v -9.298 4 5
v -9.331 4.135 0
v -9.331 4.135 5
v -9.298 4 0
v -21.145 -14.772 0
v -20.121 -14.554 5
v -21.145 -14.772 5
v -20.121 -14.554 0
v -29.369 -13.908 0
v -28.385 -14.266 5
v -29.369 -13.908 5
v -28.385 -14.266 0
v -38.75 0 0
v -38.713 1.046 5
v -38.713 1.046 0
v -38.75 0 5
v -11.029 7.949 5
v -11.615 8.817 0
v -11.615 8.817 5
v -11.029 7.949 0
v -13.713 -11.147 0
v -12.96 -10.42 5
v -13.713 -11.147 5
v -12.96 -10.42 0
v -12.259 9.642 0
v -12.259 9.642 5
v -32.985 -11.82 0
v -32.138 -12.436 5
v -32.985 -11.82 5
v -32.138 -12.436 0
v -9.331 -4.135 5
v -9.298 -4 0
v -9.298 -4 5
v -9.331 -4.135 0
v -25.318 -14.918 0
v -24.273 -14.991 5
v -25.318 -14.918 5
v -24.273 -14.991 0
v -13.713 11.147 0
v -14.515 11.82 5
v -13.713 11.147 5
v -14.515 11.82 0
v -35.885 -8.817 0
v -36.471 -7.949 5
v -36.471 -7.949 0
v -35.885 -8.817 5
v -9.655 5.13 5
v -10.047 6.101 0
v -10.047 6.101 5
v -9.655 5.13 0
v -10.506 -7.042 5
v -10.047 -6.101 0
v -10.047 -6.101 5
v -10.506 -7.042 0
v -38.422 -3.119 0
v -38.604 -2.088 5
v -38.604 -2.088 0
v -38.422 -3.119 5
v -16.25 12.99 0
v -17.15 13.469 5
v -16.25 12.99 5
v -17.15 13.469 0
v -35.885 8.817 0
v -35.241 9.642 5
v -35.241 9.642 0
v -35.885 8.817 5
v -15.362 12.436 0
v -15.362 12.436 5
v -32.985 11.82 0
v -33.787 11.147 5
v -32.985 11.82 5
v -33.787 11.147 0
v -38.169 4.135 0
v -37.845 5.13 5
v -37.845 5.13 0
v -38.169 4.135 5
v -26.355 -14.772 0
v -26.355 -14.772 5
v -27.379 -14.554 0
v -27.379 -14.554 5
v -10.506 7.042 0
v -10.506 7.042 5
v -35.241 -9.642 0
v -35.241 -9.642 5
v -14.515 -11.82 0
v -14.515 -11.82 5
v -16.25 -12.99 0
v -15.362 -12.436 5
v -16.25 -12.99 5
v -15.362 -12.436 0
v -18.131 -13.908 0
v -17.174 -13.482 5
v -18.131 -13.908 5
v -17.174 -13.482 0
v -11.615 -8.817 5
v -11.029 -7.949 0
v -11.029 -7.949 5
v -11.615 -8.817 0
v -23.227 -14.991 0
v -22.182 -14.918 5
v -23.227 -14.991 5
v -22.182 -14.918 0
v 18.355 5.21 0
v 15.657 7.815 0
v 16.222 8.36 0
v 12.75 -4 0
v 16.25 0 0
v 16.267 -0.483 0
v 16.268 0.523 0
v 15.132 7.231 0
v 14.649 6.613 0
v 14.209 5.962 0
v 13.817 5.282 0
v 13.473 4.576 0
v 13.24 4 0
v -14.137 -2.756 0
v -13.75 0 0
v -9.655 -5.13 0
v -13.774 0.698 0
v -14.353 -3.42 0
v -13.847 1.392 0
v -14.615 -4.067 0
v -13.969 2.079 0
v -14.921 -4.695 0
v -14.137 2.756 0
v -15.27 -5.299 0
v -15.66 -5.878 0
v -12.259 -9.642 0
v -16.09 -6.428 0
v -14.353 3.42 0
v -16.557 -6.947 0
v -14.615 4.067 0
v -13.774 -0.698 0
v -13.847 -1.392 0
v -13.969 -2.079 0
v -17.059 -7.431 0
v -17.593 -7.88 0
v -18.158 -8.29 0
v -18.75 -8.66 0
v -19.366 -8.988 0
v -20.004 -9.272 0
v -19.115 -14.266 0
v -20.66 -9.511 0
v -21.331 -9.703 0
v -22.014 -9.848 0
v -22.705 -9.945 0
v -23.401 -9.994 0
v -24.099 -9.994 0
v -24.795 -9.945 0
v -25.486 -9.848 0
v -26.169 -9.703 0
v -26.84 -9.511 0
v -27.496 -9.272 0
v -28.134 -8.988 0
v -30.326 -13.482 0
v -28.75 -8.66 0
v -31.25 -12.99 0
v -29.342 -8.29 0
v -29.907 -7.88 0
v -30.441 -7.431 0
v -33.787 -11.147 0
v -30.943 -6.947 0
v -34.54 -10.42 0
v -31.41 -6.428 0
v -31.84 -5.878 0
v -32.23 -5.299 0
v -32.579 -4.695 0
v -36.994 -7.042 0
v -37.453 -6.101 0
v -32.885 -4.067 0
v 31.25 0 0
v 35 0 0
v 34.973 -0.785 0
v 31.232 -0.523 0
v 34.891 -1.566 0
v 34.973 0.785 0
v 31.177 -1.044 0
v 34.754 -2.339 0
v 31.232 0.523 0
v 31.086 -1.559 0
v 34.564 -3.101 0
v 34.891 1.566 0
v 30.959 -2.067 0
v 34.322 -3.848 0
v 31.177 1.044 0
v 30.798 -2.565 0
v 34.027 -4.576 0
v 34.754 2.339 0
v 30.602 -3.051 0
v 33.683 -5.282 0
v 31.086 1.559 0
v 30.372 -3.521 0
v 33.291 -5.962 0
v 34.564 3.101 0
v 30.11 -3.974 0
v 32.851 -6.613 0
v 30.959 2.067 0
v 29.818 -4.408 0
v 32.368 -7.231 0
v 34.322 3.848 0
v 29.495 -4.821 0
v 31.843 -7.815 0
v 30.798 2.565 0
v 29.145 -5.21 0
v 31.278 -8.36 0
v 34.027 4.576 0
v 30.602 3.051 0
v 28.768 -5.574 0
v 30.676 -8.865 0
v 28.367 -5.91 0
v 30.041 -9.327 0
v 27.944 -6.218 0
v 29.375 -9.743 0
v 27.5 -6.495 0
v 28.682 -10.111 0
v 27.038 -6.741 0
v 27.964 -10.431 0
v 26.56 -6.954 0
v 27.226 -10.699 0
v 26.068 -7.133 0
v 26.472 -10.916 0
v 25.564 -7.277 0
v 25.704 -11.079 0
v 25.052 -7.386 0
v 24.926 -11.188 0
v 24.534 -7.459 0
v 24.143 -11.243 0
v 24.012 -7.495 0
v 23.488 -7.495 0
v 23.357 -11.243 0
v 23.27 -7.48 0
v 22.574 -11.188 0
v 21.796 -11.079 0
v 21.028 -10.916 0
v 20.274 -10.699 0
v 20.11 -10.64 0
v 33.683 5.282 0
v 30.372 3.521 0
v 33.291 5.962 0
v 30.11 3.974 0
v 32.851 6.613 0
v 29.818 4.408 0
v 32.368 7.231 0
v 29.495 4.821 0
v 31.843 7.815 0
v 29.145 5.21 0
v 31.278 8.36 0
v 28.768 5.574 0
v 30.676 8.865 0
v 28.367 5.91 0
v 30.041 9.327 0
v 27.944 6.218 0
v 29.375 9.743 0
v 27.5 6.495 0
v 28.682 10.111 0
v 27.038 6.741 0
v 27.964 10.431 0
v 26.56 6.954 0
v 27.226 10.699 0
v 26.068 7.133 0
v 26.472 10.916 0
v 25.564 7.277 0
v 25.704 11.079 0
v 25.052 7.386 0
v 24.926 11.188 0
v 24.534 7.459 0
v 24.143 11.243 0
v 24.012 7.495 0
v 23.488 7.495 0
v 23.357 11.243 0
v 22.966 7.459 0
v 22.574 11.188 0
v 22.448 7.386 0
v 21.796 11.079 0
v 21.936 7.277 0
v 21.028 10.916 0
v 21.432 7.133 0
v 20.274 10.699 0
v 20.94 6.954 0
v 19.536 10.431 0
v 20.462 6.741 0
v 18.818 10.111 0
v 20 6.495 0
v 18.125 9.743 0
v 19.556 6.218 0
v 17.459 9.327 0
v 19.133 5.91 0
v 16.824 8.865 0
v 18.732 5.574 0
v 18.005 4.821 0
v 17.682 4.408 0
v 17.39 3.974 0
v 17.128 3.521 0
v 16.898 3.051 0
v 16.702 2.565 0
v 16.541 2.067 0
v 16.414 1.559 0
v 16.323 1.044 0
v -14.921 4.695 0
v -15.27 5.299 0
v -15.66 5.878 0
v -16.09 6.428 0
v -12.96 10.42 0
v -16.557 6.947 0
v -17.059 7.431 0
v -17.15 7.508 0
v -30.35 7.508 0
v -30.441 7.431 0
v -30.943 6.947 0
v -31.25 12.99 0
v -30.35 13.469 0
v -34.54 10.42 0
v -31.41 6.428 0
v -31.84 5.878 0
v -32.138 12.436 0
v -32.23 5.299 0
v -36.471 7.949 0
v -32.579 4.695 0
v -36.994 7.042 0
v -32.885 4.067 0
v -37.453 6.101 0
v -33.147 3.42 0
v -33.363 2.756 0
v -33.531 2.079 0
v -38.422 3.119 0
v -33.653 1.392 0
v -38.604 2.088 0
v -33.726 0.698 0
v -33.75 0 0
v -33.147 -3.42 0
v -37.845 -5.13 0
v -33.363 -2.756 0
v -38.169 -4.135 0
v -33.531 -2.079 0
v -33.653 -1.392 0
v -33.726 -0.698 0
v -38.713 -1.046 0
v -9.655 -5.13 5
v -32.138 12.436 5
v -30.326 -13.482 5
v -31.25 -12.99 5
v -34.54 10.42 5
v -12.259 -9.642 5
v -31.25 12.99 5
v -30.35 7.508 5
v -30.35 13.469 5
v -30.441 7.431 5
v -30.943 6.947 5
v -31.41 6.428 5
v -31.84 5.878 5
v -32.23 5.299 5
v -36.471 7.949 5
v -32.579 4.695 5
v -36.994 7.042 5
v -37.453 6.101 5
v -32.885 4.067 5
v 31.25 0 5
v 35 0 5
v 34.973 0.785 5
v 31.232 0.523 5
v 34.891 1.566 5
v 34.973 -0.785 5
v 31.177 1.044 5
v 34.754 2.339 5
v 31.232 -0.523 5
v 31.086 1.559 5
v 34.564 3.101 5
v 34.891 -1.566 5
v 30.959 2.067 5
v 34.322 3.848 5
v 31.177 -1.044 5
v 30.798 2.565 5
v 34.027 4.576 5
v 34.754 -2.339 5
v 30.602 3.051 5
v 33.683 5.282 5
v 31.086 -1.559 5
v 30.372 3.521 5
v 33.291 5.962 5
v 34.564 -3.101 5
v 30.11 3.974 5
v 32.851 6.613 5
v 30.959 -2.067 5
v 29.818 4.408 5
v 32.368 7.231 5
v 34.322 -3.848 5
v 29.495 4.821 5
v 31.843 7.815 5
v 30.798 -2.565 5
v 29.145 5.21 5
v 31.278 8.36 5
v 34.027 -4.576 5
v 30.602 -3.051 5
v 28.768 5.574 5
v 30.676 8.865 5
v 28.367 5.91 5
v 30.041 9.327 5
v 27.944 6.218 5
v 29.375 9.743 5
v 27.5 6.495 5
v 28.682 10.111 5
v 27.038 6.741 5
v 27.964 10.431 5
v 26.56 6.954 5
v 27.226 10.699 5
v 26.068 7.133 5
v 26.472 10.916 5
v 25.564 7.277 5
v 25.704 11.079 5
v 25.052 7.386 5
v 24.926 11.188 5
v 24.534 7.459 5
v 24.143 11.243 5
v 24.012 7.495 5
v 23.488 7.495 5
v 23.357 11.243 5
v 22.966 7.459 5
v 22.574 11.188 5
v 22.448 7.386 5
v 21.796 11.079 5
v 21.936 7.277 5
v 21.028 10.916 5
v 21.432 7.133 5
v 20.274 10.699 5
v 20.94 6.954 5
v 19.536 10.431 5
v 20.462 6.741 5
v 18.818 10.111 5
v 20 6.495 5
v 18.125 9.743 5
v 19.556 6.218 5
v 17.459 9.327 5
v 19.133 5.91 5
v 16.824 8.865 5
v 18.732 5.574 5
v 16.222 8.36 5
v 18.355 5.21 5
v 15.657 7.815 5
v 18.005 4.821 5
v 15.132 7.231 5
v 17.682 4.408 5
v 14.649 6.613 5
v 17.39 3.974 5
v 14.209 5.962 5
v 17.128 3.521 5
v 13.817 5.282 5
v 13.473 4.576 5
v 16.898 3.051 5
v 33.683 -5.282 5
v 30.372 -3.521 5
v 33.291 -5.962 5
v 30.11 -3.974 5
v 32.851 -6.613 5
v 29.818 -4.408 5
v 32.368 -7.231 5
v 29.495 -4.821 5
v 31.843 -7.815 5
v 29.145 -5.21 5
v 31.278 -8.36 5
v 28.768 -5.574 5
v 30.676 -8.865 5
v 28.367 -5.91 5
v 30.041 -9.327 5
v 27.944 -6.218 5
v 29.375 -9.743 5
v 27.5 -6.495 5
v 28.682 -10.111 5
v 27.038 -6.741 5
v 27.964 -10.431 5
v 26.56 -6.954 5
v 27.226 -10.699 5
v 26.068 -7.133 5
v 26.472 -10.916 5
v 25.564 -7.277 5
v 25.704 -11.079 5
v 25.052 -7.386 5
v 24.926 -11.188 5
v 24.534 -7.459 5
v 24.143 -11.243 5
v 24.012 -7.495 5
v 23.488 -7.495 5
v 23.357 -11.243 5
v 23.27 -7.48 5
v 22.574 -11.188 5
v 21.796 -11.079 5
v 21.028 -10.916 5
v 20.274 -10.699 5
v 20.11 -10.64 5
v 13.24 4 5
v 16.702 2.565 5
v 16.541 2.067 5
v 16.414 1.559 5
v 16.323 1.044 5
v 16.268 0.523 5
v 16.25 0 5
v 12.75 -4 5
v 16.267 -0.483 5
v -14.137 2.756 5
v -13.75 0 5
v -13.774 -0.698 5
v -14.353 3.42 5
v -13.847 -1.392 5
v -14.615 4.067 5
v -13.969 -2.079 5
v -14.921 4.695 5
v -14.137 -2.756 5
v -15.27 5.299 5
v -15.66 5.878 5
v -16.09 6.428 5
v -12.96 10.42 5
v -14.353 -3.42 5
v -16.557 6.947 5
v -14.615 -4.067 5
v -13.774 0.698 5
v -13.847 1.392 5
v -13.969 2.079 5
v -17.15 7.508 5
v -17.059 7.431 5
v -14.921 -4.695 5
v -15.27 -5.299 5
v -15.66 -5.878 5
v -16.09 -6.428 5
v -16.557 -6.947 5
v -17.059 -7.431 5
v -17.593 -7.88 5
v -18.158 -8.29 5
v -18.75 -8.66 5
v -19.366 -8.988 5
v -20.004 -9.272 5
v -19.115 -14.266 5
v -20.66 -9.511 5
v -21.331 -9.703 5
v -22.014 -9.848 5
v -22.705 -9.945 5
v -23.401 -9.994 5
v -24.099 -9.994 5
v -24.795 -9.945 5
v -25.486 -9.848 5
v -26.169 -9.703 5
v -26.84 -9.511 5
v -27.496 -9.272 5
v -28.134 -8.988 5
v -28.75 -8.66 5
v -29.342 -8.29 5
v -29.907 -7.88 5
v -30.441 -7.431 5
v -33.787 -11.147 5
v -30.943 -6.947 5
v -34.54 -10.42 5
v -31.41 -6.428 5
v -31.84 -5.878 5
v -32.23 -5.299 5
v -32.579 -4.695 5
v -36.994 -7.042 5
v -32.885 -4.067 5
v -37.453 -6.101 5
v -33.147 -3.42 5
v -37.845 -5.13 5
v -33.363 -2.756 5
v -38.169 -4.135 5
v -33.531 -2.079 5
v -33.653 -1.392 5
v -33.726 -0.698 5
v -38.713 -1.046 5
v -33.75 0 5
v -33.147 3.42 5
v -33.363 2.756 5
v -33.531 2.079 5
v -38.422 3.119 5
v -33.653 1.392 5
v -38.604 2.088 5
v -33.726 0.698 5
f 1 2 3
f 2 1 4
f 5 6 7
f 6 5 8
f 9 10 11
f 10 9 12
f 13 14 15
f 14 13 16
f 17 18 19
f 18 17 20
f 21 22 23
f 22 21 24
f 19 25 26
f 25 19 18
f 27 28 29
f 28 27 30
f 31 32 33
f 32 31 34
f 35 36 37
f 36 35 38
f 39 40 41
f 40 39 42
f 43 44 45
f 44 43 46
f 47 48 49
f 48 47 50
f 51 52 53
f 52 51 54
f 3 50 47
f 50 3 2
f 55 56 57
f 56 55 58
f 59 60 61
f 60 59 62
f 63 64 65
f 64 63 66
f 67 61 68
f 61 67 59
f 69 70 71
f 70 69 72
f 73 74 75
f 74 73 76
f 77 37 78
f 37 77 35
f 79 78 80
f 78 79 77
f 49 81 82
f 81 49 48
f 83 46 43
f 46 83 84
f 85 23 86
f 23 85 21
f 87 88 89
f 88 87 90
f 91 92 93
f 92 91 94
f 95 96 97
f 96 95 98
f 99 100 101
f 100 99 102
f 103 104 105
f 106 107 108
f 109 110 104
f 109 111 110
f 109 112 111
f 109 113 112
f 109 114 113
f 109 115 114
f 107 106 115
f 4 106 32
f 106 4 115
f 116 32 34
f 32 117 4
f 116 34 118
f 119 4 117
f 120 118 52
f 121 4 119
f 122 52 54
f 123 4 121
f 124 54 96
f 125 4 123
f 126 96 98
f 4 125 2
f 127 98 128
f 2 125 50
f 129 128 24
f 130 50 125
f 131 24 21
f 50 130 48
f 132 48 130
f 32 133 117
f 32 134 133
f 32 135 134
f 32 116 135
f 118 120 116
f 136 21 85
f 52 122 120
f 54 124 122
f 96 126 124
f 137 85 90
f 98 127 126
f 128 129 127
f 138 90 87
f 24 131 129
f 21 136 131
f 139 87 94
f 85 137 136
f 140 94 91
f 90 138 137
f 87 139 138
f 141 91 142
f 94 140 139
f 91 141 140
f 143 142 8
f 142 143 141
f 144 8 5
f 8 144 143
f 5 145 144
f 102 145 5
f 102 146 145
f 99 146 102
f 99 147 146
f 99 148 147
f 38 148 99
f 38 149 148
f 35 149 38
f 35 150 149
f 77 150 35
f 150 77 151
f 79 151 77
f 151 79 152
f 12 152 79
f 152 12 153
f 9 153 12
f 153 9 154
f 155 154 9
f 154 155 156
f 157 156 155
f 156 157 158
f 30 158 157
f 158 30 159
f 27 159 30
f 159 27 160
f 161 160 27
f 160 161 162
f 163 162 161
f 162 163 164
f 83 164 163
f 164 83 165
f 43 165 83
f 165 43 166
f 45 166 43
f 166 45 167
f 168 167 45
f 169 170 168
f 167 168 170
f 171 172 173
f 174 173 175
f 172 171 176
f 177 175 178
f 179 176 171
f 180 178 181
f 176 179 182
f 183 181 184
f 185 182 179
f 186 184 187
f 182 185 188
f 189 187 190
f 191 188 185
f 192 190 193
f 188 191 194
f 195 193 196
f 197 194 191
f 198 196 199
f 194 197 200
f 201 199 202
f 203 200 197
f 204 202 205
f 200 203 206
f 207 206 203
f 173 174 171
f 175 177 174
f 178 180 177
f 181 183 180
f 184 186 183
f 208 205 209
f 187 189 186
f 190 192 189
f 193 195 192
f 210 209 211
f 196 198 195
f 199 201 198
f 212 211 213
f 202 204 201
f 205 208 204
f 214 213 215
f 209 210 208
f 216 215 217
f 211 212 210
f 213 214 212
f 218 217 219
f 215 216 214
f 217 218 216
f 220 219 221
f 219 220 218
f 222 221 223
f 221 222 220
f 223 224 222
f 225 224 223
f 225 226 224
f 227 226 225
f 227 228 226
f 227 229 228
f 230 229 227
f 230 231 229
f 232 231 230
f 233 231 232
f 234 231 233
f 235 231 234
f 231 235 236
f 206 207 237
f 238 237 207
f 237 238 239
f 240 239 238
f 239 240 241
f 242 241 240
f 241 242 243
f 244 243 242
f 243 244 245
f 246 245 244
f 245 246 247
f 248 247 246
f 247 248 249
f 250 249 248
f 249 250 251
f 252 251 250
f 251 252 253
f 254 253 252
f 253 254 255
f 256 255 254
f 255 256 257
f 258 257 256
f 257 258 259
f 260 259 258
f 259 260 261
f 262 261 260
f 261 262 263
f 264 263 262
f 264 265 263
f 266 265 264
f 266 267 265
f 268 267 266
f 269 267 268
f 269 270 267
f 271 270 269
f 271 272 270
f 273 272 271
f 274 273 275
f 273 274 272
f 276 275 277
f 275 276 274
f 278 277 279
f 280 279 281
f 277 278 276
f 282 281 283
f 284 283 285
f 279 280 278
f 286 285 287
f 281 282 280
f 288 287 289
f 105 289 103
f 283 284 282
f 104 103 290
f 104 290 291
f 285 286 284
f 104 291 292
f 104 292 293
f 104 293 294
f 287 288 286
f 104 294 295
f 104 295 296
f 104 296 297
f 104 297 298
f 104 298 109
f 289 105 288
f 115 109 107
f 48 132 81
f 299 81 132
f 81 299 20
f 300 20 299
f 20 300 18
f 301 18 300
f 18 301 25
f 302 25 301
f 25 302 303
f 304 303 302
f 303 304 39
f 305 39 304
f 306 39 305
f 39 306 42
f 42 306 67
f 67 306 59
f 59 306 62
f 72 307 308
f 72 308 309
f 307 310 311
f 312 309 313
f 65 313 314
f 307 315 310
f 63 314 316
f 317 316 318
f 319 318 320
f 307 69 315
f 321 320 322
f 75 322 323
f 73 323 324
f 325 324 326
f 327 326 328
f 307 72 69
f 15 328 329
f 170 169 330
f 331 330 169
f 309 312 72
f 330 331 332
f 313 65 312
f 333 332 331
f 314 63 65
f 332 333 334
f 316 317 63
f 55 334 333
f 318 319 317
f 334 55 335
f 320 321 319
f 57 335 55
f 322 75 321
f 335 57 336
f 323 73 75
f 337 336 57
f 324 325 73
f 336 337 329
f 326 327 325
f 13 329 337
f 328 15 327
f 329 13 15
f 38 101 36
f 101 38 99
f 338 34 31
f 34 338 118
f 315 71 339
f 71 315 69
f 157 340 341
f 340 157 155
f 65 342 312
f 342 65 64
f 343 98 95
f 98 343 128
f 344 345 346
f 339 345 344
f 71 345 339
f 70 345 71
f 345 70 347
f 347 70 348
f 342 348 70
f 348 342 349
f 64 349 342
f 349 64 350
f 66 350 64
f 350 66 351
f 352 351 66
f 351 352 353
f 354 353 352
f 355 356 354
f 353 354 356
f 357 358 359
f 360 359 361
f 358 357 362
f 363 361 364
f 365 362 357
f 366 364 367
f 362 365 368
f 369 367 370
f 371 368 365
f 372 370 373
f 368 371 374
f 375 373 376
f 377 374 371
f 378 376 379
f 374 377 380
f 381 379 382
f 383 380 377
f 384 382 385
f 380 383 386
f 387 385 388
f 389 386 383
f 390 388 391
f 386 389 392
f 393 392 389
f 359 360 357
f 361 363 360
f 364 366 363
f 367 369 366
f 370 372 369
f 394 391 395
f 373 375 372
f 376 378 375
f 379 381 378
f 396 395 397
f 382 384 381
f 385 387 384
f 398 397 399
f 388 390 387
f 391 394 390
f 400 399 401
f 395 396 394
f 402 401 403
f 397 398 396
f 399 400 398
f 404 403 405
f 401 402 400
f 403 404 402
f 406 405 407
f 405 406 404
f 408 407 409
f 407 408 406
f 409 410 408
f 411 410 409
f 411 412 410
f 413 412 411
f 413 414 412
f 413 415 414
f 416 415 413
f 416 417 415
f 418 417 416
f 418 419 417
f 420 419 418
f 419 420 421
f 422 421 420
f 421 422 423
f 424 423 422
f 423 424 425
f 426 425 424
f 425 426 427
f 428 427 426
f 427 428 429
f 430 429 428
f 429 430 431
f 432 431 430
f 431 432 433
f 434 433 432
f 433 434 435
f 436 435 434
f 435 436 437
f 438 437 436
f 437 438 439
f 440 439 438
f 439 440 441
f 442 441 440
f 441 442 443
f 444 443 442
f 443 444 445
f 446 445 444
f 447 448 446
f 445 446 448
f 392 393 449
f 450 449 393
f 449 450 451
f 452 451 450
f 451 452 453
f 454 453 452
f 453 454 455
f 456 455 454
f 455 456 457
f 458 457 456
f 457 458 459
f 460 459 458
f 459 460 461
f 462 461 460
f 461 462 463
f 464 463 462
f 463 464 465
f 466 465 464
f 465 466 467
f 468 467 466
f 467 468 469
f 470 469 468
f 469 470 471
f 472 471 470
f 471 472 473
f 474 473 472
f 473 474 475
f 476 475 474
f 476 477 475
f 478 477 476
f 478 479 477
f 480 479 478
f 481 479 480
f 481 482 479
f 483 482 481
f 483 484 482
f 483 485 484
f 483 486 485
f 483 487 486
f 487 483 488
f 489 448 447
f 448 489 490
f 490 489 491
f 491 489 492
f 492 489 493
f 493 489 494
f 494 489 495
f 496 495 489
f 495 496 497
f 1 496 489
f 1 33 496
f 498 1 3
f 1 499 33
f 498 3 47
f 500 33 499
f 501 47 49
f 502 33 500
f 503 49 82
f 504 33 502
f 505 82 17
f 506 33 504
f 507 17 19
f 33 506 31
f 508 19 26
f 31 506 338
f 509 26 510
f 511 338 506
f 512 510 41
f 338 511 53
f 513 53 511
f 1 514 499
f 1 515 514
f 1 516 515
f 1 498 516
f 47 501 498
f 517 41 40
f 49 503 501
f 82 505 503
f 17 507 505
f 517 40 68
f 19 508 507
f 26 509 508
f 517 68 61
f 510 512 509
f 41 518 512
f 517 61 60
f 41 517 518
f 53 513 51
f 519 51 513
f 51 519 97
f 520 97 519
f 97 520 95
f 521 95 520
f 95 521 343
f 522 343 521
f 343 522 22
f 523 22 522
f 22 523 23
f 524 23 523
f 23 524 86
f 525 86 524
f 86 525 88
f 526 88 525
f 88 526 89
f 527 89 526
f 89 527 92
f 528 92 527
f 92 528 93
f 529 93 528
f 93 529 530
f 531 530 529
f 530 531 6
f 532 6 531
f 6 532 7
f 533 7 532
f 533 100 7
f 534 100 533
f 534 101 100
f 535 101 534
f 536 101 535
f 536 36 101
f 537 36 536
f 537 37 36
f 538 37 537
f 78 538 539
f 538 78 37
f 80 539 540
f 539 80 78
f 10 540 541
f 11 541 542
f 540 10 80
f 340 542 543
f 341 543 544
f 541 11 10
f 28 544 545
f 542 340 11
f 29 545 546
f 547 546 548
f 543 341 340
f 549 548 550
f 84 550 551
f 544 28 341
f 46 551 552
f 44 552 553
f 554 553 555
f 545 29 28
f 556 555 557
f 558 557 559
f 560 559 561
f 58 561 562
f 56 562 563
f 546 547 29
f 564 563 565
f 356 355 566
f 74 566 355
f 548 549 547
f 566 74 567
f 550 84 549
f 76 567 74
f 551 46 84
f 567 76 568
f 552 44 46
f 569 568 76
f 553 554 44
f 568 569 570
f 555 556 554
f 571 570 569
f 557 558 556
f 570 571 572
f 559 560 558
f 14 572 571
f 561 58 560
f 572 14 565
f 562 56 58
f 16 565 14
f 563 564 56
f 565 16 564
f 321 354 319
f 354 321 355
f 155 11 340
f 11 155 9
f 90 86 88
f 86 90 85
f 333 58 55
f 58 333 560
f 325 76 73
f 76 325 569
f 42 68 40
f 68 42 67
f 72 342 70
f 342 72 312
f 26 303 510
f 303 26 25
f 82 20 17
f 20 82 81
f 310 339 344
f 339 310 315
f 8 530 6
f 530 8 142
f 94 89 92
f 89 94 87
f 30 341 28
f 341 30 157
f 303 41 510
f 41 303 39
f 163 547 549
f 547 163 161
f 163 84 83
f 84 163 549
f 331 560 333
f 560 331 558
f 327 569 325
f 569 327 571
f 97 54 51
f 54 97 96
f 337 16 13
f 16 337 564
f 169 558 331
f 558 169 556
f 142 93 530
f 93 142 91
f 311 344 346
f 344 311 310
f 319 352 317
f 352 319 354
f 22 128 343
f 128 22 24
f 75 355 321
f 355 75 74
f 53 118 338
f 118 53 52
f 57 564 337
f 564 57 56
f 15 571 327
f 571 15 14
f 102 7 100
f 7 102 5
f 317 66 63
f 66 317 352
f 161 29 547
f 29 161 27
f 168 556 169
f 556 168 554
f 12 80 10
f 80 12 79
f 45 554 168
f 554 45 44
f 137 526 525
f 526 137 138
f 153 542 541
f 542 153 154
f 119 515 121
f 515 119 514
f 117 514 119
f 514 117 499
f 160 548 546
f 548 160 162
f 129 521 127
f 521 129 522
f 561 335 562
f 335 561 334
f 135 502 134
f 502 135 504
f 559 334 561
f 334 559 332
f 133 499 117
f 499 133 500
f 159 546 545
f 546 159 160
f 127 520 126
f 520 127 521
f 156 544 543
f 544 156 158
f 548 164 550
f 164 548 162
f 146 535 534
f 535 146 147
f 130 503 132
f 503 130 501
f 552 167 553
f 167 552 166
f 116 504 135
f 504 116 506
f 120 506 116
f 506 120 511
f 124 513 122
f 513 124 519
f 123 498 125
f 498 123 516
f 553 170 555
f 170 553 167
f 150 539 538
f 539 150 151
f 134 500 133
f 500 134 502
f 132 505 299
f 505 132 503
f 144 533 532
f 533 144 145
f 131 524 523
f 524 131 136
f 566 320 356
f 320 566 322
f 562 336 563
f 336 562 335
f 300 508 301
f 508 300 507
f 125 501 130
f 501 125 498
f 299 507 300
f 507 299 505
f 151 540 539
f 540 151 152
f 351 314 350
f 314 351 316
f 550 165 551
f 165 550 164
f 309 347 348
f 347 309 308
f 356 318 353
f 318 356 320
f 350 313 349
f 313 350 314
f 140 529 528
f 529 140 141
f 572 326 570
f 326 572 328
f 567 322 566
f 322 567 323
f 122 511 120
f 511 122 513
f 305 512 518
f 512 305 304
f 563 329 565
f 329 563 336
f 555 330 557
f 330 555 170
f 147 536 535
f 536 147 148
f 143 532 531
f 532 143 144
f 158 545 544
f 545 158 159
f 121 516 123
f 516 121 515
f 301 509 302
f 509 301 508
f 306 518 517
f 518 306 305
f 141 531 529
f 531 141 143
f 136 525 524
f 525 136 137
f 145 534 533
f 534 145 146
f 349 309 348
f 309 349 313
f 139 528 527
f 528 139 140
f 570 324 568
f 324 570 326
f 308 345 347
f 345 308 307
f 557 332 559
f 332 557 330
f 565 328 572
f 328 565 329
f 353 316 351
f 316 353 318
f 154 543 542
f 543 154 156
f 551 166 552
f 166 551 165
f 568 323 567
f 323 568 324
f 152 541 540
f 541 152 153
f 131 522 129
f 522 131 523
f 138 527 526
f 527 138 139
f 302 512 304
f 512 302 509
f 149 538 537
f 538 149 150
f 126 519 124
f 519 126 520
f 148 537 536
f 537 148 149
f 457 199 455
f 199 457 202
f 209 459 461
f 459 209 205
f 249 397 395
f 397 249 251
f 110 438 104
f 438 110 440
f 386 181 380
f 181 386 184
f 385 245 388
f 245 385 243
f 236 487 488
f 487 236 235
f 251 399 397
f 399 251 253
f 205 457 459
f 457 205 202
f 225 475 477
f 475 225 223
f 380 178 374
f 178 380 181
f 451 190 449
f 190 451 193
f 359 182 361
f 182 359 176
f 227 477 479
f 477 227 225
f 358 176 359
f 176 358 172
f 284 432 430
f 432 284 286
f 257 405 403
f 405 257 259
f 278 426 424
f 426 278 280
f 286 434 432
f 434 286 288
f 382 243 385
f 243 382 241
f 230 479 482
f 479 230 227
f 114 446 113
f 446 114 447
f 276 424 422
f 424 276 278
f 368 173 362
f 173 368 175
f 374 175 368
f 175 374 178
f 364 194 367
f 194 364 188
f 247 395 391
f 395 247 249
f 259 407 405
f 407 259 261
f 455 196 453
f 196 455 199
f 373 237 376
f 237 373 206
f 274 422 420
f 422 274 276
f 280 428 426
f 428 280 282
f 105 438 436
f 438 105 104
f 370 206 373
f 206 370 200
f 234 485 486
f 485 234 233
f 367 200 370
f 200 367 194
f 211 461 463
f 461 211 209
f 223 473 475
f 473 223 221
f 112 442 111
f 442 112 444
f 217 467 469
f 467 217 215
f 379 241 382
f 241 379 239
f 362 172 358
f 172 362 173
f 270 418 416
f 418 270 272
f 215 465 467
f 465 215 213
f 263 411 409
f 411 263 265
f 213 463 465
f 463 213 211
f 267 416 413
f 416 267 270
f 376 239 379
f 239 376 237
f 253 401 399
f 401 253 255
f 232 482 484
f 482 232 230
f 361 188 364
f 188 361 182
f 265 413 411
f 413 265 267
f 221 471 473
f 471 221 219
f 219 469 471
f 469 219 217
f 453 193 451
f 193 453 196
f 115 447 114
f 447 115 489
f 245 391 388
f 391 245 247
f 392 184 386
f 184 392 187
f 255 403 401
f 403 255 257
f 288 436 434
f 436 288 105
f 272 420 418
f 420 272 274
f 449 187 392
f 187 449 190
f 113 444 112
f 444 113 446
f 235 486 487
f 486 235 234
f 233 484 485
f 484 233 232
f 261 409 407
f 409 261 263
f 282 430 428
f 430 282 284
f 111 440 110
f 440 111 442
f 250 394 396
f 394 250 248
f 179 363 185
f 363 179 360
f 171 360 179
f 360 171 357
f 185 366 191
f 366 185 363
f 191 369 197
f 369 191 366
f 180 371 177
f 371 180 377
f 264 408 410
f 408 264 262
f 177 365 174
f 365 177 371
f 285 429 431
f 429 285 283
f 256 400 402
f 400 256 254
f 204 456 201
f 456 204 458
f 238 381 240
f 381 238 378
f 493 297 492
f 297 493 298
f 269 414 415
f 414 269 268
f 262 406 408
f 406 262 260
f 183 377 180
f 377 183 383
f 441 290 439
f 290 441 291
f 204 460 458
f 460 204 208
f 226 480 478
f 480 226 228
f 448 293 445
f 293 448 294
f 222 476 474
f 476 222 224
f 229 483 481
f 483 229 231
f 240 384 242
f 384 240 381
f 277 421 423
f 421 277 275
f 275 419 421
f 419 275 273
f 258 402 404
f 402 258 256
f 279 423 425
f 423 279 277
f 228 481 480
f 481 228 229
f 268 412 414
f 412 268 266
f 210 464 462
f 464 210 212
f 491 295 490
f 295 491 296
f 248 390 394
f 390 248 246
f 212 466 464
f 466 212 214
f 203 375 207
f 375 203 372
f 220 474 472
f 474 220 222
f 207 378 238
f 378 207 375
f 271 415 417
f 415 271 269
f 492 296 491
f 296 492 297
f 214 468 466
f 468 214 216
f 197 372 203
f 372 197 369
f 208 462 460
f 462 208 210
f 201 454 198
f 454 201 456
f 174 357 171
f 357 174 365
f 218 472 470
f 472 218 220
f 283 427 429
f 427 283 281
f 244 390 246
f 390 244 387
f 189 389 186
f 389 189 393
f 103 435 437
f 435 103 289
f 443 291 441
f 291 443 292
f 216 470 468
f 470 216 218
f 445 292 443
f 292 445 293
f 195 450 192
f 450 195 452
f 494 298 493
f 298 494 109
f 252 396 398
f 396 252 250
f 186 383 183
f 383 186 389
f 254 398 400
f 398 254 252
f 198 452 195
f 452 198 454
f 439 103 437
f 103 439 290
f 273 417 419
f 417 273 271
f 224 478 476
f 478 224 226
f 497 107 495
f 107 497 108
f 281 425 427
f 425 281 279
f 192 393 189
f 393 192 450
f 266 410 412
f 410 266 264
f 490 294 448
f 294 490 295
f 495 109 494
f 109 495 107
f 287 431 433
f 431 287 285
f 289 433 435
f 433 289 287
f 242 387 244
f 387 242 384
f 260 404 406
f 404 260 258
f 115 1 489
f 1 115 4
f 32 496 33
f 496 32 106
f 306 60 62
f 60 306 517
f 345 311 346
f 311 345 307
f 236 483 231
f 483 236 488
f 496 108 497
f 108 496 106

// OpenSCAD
// A highly customizable S-Hook
// http://6brueder.wordpress.com
// October 2013
// Public Domain - Creative Commons CC0 1.0

// Inner diameter of the first ring
diameter_1              = 20;	// [1:200]

// Inner diameter of the second ring
diameter_2              = 15;	// [1:200]

// Distance between both rings
distance_type           = 1;	// [1:Manual distance,2:Closest distance]

// Only be used when "Distance Type = Manual distance"
manual_distance         = 30;	// [1:300]

// Strength of the rings, % in relation to the larger diameter
ring_strength           = 25;	// [1:100]

shape                   = 1;	// [1:S-Shape,2:3-Shape]

/* [Vents] */
vent_1_rotation         = 0;	// [-90:45]
vent_2_rotation         = 45;	// [-90:45]

// Size of the first vent in % in relation to the larger diameter
vent_1_strength         = 66;	// [1:100] 

// Size of the second vent in % in relation to the smaller diameter
vent_2_strength         = 66;	// [1:100]


// Calculations
large                   = diameter_1 > diameter_2 ? diameter_1 : diameter_2;
small                   = diameter_1 > diameter_2 ? diameter_2 : diameter_1;
ring_strength_normalized= ring_strength / 100;
global_height           = large * ring_strength_normalized;


// Distance
real_manual_distance    = manual_distance + diameter_1 / 2 + diameter_2 / 2;
closest_distance			= large / 2 + small / 2 + global_height;
distance_normalized     = distance_type == 1 ? real_manual_distance : closest_distance;


// Vents
vent_size_1             = large * (vent_1_strength / 100);
vent_size_2             = small * (vent_2_strength / 100);

shape_normalized        = shape;

vent_2_rotation_calc    = (shape_normalized == 1) ? (-vent_2_rotation + 180) : vent_2_rotation;


// Ring module
module ring(inner_diameter) {
    ring_size = inner_diameter * ring_strength_normalized;

    difference() {
        cylinder(h = global_height, r = (inner_diameter/2) + ring_size);
        translate([0,0,-0.1]) cylinder(h = global_height + 0.2, r = (inner_diameter/2));
    }
}


translate([-distance_normalized/2,0,0]) {
	difference() {
	    union() {
	        // First ring
	        ring(large);
	        
	        // Second ring
	        translate ([distance_normalized,0,0]) ring(small);
	        
	        
	        difference() {
	            // Connection bar
	            translate([0,-global_height * 1.6/2,0]) cube([distance_normalized, global_height * 1.6, global_height]);
	            
	            // The holes
	            union() {
	                translate([0,0,-0.1]) cylinder(h = global_height + 0.2, r = (large/2));
	                translate([distance_normalized,0,-0.1]) cylinder(h = global_height + 0.2, r = (small/2));
	            }
	        }
	    }
	    
	    // Vents
	    union() {
	         rotate(-vent_1_rotation) translate([-vent_size_1/2,0,-0.1]) cube([vent_size_1, large/2 + global_height + 1, global_height + 0.2]);
	
	        translate ([distance_normalized,0,0]) {
	            rotate(vent_2_rotation_calc) translate([-vent_size_2/2,0,-0.1]) cube([vent_size_2, small/2 + global_height + 1, global_height + 0.2]);
	        }
	    }
	}
}

//preview[view:east,tilt:top]
$fn = 90;
